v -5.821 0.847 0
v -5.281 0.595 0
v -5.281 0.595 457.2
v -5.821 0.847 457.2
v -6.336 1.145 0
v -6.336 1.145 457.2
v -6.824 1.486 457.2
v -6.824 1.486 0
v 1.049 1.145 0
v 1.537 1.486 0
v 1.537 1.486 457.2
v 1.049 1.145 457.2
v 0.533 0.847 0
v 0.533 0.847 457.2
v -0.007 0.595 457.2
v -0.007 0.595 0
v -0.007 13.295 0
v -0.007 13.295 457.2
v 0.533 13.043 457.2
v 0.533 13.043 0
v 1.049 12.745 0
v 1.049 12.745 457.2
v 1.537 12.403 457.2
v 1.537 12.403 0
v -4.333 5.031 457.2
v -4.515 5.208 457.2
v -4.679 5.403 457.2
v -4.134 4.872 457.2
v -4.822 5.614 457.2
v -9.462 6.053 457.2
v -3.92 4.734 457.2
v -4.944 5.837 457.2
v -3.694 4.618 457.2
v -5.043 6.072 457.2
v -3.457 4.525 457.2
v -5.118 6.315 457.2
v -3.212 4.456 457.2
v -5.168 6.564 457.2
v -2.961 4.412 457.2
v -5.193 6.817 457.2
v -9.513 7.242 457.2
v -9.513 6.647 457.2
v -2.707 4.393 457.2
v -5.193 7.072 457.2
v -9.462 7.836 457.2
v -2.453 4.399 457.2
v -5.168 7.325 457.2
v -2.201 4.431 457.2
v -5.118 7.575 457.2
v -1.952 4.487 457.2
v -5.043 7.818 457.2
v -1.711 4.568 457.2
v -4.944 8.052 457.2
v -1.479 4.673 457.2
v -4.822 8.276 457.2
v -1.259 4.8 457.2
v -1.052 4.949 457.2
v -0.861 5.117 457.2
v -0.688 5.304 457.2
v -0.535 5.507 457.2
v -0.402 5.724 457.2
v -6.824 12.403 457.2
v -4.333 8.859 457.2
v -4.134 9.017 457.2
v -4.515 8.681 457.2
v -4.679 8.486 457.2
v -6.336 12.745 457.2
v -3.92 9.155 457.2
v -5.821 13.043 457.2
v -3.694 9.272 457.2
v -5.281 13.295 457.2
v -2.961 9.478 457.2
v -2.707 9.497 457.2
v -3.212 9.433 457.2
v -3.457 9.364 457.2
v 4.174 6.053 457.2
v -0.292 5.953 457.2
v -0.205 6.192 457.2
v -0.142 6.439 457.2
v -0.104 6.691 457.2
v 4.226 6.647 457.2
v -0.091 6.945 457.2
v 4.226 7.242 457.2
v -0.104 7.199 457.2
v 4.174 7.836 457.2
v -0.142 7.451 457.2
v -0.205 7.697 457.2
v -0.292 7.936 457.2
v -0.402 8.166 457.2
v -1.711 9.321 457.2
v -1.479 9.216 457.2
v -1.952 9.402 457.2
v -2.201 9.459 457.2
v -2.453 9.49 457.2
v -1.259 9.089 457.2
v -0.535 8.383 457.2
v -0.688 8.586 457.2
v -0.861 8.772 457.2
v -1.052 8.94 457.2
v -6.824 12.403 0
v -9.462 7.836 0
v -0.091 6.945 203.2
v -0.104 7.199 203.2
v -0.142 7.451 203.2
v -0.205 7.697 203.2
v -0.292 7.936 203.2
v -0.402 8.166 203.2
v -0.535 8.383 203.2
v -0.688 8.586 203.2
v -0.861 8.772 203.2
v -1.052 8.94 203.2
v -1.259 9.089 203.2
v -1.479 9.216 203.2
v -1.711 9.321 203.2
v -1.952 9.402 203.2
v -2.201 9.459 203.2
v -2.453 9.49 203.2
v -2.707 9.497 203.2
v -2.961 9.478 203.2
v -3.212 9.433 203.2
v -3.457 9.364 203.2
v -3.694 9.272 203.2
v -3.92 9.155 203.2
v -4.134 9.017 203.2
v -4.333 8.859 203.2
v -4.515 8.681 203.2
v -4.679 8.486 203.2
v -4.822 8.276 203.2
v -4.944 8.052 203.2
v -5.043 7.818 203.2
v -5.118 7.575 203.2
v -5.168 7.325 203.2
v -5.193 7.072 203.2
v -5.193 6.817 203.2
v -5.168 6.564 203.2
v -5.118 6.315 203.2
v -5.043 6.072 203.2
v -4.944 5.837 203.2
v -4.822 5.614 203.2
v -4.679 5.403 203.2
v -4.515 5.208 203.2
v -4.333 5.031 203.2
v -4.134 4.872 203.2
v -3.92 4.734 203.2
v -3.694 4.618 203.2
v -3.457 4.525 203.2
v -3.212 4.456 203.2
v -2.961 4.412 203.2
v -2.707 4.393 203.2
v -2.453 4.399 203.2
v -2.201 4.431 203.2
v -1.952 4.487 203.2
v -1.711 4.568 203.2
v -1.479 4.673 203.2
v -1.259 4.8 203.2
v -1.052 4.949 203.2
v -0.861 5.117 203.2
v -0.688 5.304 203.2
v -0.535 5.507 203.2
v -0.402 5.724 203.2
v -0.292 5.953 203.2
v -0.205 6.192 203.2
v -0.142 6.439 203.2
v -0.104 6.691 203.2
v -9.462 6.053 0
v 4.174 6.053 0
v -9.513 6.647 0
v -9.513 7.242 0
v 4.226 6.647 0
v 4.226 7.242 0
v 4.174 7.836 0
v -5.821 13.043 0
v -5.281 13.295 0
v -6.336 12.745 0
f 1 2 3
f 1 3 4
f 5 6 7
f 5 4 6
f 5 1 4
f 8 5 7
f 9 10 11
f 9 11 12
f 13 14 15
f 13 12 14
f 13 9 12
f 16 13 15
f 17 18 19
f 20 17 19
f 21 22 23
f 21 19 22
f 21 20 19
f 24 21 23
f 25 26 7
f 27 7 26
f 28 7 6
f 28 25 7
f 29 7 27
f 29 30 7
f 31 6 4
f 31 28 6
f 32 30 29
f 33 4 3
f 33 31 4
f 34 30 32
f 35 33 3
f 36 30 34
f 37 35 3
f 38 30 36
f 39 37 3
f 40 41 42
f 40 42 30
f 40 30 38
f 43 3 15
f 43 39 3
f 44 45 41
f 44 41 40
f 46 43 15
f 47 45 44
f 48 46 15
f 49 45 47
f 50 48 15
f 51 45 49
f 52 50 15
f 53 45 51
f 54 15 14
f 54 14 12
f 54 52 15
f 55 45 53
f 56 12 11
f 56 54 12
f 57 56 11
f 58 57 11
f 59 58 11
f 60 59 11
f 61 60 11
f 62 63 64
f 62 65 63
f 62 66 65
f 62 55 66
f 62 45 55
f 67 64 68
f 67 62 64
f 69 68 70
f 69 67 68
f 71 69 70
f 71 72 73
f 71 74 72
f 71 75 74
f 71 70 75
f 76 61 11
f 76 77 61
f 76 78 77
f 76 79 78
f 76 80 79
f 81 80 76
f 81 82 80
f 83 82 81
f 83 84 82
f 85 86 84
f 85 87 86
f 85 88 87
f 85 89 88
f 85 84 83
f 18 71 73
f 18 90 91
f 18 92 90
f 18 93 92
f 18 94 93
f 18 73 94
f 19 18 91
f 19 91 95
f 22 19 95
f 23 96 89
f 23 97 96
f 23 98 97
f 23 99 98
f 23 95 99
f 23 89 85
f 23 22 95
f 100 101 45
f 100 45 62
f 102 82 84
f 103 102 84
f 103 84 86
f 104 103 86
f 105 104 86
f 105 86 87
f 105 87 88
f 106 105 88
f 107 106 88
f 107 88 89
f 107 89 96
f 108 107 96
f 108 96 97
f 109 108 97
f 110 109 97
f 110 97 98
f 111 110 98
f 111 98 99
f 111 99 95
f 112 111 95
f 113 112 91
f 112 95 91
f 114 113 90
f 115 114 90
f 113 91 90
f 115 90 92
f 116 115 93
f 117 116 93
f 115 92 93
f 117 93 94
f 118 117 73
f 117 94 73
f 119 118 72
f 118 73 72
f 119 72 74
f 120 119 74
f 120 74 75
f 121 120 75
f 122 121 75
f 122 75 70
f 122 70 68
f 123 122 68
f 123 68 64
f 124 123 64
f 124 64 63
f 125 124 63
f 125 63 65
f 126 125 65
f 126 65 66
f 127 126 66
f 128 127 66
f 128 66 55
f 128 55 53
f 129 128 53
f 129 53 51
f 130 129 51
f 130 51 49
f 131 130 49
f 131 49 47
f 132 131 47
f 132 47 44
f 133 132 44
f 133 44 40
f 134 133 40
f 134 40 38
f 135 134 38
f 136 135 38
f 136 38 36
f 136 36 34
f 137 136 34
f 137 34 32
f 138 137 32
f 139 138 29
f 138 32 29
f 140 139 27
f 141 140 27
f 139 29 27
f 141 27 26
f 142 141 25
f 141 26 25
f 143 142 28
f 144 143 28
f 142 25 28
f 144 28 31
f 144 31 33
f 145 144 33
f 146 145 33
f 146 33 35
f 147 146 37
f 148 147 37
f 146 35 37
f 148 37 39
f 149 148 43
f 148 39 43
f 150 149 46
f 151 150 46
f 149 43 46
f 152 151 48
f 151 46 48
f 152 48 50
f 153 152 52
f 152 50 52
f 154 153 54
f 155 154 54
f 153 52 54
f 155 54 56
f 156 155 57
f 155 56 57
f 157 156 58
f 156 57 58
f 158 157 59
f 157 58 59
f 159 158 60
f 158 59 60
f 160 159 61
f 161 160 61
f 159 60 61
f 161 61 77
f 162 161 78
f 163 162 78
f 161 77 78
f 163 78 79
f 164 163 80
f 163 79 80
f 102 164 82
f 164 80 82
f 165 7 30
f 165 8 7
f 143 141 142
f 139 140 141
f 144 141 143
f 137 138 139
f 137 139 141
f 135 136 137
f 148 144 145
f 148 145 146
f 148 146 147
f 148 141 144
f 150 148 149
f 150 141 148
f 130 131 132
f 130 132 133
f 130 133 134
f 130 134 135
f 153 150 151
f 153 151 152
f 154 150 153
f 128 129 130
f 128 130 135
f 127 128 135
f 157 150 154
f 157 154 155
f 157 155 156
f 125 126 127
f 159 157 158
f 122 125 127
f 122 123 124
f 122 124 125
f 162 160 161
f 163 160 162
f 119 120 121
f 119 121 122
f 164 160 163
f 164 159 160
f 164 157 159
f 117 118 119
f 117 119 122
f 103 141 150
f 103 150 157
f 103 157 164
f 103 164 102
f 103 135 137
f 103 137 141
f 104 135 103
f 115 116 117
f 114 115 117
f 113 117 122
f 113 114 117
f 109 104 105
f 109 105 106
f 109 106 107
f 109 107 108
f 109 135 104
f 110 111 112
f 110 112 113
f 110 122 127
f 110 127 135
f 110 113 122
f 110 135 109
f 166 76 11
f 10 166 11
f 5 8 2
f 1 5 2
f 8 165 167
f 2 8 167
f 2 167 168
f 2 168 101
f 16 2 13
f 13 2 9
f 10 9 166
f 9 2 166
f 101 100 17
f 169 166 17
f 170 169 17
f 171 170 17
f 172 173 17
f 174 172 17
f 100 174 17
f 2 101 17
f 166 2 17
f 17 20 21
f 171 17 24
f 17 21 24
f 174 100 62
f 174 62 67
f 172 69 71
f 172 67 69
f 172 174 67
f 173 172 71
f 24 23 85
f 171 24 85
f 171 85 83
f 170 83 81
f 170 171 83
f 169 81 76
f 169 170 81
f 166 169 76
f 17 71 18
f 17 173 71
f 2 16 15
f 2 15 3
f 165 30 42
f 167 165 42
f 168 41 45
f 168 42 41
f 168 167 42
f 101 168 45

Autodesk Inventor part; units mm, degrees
ref_plane "YZ Plane" through (0, 0, 0) normal (1, 0, 0) x (0, 1, 0)
ref_plane "XZ Plane" through (0, 0, 0) normal (0, 1, 0) x (-1, 0, 0)
ref_plane "XY Plane" through (0, 0, 0) normal (0, 0, 1) x (1, 0, 0)
sketch "Sketch1" plane through (0, 0, 0) normal (0, 0, 1) x (1, 0, 0)
  circle A0 centre (-2.6438, 6.9447) radius 6.8758
  line L0 (-9.4616, 7.8359) -> (-6.8245, 12.4034)
  line L1 (-6.8245, 1.4859) -> (-9.4616, 6.0534)
  line L2 (-0.0068, 0.5947) -> (-5.2808, 0.5947)
  line L3 (4.174, 6.0534) -> (1.537, 1.4859)
  line L4 (1.537, 12.4034) -> (4.174, 7.8359)
  line L5 (-5.2808, 13.2947) -> (-0.0068, 13.2947)
  point P0 (0, 0)
  point P1 (1.537, 1.4859)
  dimension "d0" = 13.7516
  dimension "d4" = 360
extrude "Extrusion1" add sketch "Sketch1" along normal blind 457.2 contours A0 L3 L2 L1 L0 L5 L4
sketch "Sketch2" plane through (0, 0, 457.2) normal (0, 0, 1) x (1, 0, 0)
  circle A0 centre (-2.6438, 6.9447) radius 2.5527
  line L0 (-5.2808, 0.5947) -> (-0.0068, 0.5947) projected
  line L1 (-2.6438, 6.9447) -> (-5.2808, 0.5947) construction
  line L2 (-2.6438, 6.9447) -> (-0.0068, 0.5947) construction
  point P0 (0, 0)
  dimension "d8" = 5.1054
  dimension "d9" = 6.35
extrude "Extrusion2" cut sketch "Sketch2" against normal blind 254
equation "\"d10\" = d5"
equation "\"d5\" = 254"
properties part number "12in THUNDERSHAFT STOCK"
